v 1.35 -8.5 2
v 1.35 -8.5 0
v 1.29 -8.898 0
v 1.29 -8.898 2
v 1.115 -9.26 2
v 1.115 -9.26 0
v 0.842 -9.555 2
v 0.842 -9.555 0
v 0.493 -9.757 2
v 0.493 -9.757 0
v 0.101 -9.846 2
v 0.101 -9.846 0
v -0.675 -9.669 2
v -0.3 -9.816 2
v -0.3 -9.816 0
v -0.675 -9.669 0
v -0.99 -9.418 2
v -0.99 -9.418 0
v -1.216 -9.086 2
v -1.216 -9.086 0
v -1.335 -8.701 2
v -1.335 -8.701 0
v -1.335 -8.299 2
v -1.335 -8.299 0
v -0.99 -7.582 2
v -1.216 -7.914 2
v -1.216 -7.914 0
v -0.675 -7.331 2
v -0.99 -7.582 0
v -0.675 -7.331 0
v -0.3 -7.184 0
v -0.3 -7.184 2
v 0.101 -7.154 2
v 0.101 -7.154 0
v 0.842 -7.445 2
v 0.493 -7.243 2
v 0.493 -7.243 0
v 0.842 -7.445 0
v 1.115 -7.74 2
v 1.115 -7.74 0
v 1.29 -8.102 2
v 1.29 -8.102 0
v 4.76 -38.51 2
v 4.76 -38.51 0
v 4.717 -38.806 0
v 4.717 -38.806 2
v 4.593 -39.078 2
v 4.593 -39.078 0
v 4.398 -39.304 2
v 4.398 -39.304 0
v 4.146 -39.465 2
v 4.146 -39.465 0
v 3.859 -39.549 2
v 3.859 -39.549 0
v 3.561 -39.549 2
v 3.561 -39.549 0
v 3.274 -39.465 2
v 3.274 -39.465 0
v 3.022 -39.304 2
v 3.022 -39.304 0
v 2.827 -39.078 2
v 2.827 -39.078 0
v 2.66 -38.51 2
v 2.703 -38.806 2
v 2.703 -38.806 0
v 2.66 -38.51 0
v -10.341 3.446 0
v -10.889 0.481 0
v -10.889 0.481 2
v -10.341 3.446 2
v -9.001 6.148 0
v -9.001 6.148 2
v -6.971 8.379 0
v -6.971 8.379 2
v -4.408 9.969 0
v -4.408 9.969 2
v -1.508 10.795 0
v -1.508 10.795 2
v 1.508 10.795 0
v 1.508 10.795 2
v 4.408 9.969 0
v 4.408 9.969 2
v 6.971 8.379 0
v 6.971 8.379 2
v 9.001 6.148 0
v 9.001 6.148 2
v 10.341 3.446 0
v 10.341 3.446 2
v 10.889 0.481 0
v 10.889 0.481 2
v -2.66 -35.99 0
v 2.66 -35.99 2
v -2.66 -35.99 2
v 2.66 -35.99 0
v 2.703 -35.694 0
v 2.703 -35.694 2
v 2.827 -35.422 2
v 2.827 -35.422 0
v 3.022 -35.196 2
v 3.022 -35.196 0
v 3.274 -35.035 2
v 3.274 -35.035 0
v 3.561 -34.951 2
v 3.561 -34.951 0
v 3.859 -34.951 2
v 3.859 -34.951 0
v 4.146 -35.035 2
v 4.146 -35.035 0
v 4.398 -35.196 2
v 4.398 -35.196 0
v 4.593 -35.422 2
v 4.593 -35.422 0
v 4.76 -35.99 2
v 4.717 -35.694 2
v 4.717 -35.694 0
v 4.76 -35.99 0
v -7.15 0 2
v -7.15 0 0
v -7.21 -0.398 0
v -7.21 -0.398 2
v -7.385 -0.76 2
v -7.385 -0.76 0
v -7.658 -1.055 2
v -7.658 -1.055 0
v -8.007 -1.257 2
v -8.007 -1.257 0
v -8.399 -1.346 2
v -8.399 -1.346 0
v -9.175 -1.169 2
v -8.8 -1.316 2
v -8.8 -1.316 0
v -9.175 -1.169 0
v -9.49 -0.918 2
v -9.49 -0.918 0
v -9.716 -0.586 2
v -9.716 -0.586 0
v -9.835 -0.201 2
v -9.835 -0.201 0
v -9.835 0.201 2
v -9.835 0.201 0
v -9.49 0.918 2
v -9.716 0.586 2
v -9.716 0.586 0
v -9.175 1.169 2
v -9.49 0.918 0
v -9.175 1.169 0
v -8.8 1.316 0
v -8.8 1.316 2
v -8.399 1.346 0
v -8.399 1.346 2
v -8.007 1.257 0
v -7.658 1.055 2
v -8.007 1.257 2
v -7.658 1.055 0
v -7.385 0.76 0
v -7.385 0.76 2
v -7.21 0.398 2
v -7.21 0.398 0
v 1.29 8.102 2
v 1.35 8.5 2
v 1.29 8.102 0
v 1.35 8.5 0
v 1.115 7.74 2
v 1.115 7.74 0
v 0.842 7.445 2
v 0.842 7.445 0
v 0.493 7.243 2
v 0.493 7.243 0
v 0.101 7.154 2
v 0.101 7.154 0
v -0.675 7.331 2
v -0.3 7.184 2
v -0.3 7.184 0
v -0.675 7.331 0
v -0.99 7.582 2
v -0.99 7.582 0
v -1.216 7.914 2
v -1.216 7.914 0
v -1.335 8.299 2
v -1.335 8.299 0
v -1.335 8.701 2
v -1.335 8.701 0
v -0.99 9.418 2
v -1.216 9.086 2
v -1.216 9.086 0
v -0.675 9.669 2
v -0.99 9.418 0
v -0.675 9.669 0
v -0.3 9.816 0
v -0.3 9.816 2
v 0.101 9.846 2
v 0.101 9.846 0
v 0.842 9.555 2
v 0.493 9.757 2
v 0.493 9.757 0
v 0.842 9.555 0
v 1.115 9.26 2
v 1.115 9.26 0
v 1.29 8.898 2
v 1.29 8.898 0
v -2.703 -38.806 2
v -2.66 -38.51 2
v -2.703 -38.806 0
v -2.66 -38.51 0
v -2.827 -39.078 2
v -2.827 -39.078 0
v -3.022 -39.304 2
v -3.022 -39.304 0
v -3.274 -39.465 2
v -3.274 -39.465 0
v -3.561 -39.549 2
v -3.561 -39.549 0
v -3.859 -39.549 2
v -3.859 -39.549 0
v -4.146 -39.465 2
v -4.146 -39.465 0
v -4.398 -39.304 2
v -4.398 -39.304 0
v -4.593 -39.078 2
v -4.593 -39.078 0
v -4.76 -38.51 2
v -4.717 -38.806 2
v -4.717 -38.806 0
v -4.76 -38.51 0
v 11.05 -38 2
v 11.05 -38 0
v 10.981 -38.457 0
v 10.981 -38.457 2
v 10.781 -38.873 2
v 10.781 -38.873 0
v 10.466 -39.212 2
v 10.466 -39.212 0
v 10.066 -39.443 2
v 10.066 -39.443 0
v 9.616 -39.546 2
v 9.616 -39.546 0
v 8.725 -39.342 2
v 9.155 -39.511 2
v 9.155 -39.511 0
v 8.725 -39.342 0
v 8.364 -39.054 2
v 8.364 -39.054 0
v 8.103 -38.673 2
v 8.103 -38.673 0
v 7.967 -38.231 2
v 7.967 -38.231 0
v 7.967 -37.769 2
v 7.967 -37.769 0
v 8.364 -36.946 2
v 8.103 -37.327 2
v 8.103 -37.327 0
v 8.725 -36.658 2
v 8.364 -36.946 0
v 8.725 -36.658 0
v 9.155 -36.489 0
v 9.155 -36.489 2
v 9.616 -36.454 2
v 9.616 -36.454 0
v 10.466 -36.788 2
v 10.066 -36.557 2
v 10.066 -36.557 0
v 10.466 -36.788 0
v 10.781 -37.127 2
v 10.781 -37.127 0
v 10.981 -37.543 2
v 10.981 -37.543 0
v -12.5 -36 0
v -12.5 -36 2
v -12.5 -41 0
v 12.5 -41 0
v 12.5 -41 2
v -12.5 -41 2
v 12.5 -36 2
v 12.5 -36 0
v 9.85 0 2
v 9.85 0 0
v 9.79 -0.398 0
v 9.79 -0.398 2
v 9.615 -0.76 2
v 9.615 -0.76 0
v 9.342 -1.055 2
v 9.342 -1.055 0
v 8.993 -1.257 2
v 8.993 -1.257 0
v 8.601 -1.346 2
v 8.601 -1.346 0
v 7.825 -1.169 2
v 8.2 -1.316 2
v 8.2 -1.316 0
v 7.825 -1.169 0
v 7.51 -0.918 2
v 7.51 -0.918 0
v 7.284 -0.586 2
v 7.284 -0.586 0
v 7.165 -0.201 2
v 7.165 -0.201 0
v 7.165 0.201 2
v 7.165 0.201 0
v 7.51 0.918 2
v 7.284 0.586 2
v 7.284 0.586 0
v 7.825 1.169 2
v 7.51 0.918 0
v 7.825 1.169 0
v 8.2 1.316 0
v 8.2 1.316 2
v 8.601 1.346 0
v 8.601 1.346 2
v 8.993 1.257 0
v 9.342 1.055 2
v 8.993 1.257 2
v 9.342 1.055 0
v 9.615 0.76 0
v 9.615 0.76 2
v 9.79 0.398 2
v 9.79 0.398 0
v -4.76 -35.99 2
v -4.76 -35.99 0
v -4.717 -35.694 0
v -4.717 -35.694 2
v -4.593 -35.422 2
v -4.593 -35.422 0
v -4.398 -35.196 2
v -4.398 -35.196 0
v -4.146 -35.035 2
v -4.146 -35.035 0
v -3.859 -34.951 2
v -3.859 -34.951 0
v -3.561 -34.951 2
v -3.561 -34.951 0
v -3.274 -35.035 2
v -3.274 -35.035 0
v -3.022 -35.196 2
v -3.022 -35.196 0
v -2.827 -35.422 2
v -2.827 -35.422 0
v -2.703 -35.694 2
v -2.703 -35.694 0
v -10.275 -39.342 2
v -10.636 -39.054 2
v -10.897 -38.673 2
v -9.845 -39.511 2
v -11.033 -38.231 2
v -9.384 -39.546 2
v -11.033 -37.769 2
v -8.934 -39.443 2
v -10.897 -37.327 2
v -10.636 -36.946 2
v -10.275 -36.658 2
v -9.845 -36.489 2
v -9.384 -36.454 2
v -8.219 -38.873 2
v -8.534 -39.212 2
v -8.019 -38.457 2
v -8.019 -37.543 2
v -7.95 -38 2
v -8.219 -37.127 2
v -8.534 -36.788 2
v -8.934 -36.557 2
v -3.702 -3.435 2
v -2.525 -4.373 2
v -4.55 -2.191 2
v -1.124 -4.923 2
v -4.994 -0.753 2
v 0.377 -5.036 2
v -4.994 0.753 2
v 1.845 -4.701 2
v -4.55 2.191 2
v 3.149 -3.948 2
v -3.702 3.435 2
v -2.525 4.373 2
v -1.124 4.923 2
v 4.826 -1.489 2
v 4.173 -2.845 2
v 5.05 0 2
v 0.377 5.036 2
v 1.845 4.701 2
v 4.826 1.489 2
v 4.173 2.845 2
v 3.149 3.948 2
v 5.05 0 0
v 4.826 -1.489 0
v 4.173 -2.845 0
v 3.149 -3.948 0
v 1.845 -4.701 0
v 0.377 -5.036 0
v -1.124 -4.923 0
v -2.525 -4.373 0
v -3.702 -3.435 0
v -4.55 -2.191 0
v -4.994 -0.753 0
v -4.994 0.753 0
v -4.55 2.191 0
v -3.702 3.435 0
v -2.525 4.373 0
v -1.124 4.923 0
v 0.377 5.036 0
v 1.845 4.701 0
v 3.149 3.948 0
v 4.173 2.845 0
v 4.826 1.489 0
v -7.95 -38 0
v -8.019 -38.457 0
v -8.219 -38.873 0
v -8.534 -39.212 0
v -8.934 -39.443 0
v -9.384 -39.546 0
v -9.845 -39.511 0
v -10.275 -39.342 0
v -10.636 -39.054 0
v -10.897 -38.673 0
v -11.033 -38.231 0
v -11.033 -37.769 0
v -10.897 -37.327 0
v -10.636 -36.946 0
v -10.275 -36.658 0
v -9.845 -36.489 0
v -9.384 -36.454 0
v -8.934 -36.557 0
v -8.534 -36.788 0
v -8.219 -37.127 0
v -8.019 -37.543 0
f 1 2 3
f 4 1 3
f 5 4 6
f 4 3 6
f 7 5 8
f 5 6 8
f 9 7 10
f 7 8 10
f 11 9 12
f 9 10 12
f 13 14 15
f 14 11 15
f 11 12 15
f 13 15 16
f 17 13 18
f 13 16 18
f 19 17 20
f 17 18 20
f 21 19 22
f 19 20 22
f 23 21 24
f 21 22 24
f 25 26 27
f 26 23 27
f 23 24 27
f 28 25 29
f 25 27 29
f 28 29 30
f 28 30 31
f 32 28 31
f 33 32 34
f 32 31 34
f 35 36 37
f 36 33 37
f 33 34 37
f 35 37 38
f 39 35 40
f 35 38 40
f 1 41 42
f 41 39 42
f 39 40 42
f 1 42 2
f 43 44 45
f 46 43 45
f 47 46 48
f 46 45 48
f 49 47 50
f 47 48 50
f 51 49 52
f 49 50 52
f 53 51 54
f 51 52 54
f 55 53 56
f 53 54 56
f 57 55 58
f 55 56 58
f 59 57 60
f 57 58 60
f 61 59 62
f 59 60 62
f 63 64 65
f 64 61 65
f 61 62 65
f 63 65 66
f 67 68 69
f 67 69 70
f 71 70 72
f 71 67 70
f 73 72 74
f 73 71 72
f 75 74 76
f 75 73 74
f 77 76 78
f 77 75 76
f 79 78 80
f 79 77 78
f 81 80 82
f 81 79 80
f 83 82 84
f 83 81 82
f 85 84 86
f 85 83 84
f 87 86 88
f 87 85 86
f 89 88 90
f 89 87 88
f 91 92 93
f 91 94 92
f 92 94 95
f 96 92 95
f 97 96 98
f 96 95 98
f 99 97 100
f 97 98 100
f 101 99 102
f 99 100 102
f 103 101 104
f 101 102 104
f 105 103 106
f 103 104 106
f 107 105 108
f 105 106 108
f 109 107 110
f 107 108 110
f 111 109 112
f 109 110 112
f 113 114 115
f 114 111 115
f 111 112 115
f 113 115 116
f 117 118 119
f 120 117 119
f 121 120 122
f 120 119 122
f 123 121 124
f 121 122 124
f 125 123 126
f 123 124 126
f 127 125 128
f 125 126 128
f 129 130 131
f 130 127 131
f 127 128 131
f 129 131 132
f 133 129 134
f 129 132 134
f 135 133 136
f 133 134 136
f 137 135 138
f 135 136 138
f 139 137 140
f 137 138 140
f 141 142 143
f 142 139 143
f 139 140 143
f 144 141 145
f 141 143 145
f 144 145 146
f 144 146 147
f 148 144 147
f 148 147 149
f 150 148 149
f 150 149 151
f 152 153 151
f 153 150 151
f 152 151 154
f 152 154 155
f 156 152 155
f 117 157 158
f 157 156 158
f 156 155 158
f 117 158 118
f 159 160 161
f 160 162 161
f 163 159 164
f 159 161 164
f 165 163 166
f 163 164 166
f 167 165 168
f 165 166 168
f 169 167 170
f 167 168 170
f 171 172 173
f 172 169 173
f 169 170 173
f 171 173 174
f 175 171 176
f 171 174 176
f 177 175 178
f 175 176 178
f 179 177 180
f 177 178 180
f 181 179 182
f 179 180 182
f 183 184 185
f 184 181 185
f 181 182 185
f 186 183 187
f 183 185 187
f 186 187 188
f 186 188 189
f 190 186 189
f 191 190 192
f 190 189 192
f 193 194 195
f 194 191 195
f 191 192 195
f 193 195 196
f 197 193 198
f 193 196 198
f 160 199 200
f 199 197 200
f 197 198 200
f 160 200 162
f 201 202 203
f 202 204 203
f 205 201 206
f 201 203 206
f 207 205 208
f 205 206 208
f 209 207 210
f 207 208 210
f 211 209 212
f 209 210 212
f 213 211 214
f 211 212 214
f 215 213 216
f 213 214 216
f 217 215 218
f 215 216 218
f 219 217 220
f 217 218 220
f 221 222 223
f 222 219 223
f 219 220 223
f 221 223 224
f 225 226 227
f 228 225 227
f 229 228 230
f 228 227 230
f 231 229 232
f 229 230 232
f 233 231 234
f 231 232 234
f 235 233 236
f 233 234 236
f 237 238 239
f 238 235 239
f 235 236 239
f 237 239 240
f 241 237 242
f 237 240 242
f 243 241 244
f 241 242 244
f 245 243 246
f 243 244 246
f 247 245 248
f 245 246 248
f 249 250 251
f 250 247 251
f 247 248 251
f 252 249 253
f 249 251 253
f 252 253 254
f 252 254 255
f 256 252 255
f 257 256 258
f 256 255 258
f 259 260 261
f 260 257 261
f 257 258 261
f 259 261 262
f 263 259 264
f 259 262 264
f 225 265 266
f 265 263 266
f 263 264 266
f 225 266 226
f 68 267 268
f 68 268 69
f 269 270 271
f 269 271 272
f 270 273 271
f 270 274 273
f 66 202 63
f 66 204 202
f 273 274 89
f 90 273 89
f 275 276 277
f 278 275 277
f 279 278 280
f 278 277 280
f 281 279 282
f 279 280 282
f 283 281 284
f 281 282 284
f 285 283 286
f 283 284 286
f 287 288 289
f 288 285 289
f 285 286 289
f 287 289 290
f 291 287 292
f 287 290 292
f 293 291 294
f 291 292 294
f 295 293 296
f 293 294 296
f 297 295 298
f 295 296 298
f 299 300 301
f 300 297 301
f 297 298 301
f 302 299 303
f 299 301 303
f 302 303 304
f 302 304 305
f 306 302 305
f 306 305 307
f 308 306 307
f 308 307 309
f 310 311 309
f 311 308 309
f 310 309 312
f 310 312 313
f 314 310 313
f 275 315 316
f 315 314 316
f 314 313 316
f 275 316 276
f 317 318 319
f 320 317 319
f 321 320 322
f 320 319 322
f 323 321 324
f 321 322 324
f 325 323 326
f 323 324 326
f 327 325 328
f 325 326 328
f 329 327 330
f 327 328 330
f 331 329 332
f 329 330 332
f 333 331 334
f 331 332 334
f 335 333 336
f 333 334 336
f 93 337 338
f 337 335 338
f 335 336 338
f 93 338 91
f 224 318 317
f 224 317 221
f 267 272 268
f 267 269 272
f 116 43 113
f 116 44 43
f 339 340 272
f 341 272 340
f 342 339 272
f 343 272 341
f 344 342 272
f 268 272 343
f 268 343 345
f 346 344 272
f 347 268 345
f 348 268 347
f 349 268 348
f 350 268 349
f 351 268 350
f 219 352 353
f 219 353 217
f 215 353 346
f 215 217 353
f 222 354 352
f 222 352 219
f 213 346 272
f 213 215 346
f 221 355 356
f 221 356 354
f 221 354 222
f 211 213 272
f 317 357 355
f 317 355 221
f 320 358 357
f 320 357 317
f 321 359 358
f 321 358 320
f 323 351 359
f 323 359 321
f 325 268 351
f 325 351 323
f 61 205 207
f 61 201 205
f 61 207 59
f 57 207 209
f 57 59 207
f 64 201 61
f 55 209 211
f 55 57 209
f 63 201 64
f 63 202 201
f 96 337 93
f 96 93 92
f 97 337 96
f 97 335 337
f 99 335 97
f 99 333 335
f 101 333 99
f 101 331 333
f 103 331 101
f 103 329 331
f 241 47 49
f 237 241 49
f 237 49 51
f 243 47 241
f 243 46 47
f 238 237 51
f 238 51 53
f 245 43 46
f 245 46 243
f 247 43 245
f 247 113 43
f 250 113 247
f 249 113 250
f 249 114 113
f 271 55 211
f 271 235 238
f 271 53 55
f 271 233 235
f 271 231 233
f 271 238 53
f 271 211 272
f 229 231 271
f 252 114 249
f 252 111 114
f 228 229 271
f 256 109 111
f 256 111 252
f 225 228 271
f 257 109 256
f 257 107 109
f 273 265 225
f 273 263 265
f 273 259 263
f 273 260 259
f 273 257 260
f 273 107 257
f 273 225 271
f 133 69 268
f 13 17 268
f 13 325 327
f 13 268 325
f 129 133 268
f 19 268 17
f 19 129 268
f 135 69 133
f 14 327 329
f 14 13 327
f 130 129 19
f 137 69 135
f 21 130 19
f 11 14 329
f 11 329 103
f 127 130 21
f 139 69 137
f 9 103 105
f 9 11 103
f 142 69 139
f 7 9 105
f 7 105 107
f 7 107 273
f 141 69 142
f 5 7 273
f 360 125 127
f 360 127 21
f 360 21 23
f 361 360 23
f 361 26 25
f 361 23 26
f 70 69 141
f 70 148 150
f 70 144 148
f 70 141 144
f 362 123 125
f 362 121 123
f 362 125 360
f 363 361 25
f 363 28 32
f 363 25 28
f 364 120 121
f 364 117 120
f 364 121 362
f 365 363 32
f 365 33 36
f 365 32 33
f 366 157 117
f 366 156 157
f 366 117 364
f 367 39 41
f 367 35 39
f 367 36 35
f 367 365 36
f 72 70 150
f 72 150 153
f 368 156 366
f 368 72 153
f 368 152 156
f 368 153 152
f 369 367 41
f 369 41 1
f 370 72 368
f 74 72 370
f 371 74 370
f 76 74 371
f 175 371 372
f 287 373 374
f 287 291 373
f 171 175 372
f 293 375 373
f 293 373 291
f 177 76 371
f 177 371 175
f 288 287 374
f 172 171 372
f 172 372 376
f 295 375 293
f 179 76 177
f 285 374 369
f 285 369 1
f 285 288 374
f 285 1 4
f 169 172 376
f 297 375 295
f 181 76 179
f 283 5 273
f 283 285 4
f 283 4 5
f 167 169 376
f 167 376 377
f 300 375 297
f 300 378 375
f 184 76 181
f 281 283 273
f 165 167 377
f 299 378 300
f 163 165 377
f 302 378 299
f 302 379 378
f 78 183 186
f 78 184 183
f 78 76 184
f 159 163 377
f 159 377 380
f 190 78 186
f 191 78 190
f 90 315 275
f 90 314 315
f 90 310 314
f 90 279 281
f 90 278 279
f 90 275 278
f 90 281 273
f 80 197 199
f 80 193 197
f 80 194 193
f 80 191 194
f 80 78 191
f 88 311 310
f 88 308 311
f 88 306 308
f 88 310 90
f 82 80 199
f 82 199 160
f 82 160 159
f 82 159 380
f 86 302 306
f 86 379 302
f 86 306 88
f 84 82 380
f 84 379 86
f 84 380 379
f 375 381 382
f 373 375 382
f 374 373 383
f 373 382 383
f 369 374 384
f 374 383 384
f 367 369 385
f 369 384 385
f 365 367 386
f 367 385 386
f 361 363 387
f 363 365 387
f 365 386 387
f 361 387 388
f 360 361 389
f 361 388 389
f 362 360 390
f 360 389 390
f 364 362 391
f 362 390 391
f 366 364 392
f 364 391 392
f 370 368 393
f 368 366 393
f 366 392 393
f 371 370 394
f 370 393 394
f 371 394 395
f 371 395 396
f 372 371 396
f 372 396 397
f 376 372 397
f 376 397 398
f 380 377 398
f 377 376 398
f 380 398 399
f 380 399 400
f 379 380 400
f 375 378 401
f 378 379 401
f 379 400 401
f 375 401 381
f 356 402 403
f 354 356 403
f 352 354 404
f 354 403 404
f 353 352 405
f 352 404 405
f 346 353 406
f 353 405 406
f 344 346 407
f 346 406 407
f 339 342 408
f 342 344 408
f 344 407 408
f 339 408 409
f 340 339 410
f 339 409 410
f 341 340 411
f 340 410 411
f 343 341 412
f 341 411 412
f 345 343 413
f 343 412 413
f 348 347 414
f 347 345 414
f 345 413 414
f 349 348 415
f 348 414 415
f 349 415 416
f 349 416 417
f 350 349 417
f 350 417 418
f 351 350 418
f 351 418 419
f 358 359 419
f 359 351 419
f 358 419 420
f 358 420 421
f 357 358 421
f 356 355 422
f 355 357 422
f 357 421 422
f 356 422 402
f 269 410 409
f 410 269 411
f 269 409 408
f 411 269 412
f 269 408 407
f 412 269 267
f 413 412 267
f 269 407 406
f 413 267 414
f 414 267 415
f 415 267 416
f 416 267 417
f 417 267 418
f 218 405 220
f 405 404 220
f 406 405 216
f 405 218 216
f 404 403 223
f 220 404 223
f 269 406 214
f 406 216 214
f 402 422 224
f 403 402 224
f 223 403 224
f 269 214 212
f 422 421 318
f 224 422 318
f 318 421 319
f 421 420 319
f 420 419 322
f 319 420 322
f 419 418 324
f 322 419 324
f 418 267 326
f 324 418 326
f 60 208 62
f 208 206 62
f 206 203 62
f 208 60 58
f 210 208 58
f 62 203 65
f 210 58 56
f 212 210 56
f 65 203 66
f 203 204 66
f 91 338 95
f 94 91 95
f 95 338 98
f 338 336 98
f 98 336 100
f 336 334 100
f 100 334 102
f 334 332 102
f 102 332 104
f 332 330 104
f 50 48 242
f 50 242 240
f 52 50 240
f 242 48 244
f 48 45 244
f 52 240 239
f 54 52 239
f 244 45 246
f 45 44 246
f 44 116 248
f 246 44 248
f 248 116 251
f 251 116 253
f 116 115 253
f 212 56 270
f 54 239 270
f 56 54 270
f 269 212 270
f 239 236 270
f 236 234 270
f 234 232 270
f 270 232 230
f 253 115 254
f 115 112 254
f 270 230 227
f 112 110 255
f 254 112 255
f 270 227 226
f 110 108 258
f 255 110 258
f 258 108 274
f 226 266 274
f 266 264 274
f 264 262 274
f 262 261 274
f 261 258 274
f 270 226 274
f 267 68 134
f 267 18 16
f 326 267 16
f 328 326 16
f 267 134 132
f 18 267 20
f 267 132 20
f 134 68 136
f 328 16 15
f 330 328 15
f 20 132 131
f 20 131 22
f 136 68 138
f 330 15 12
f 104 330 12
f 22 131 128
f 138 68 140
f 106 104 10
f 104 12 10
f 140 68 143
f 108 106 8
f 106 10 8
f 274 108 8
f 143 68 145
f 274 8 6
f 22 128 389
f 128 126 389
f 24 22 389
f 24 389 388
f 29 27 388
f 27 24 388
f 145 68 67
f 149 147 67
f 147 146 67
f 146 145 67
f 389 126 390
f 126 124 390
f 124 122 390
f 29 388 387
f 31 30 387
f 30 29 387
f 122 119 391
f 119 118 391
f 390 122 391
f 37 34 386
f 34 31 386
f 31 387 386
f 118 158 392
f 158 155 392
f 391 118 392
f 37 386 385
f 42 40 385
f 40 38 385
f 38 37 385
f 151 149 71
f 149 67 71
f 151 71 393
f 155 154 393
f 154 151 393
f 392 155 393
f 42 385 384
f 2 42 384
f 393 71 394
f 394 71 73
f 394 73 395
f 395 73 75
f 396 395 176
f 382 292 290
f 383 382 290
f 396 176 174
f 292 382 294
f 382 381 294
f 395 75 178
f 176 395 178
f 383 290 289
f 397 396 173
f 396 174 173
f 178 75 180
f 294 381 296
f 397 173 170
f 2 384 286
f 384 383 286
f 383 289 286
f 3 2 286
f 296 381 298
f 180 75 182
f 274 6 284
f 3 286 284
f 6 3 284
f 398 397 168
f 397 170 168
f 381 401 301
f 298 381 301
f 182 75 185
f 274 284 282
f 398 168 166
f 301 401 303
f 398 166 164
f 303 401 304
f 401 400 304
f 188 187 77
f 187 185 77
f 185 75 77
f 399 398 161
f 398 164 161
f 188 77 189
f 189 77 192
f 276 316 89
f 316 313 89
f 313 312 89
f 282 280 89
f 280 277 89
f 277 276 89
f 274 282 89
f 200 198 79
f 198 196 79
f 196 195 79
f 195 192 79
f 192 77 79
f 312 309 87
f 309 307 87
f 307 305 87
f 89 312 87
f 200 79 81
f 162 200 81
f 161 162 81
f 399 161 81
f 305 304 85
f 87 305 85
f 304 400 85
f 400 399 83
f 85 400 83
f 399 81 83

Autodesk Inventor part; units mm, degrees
ref_plane "YZ Plane" through (0, 0, 0) normal (1, 0, 0) x (0, 1, 0)
ref_plane "XZ Plane" through (0, 0, 0) normal (0, 1, 0) x (-1, 0, 0)
ref_plane "XY Plane" through (0, 0, 0) normal (0, 0, 1) x (1, 0, 0)
sketch "スケッチ1" plane through (0, 0, 0) normal (0, 0, 1) x (1, 0, 0)
  line L0 (-63.6765, 0) -> (66.53, 0) construction
  line L1 (0, 73.5962) -> (0, -63.7716) construction
  circle A0 centre (0, 0) radius 5.05
  circle A1 centre (0, 0) radius 8 construction
  circle A2 centre (0, 0) radius 10.9
  circle A3 centre (0, 8.5) radius 1.35
  circle A4 centre (0, 8.5) radius 2.4 construction
  circle A5 centre (-8.5, 0) radius 2.4 construction
  circle A6 centre (-8.5, 0) radius 1.35
  circle A7 centre (0, -8.5) radius 2.4 construction
  circle A8 centre (0, -8.5) radius 1.35
  circle A9 centre (8.5, 0) radius 2.4 construction
  circle A10 centre (8.5, 0) radius 1.35
  line L2 (12.5, -41) -> (-12.5, -41)
  line L3 (-12.5, -41) -> (-12.5, -36)
  line L4 (-12.5, -36) -> (12.5, -36) construction
  line L5 (12.5, -36) -> (12.5, -41)
  line L6 (12.5, -41) -> (-12.5, -36) construction
  line L7 (-12.5, -41) -> (12.5, -36) construction
  line L8 (12.5, -36) -> (10.8894, 0.4808)
  line L9 (-12.5, -36) -> (-10.8894, 0.4808)
  circle A11 centre (-9.5, -38) radius 1.55
  line L10 (-12.5, -38) -> (12.5, -38) construction
  line L11 (-4.75, -36) -> (-4.75, -41) construction
  line L12 (4.75, -36) -> (4.75, -41) construction
  circle A12 centre (9.5, -38) radius 1.55
  line L13 (-4.75, -36) -> (4.75, -36) construction
  line L14 (4.75, -36) -> (4.75, -38.5) construction
  line L15 (4.75, -38.5) -> (-4.75, -38.5) construction
  line L16 (-4.75, -38.5) -> (-4.75, -36) construction
  line L17 (-4.75, -37.25) -> (4.75, -37.25) construction
  line L18 (-4.76, -38.51) -> (4.76, -38.51)
  line L19 (4.76, -38.51) -> (4.76, -35.99)
  line L20 (4.76, -35.99) -> (-4.76, -35.99)
  line L21 (-4.76, -35.99) -> (-4.76, -38.51)
  circle A13 centre (-3.71, -35.99) radius 1.05
  circle A14 centre (-3.71, -38.51) radius 1.05
  circle A15 centre (3.71, -35.99) radius 1.05
  circle A16 centre (3.71, -38.51) radius 1.05
  point P0 (0, -38.5)
  point P1 (4.75, -36)
  point P2 (2.66, -38.51)
  point P3 (-2.66, -38.51)
  point P4 (-2.66, -35.99)
  point P5 (2.66, -35.99)
  dimension "d0" = 10.1
  dimension "d1" = 16
  dimension "d4" = 2.7
  dimension "d5" = 8.5
  dimension "d6" = 4.8
  dimension "d10" = 360
  dimension "d12" = 25
  dimension "d13" = 5
  dimension "d14" = 36
  dimension "d15" = 3
  dimension "d16" = 9.5
  dimension "d17" = 3.1
  dimension "d18" = 3
  dimension "d19" = 4.75
  dimension "d30" = 19
  dimension "d39" = 0.01
  dimension "d40" = 1.05
  dimension "d41" = 2.1
extrude "押し出し1" add sketch "スケッチ1" along normal blind 2
equation "\"d19\" = 0.5 * d16"
properties part number "Foot_back_frame" material "アルミニウム 2014-T4"
